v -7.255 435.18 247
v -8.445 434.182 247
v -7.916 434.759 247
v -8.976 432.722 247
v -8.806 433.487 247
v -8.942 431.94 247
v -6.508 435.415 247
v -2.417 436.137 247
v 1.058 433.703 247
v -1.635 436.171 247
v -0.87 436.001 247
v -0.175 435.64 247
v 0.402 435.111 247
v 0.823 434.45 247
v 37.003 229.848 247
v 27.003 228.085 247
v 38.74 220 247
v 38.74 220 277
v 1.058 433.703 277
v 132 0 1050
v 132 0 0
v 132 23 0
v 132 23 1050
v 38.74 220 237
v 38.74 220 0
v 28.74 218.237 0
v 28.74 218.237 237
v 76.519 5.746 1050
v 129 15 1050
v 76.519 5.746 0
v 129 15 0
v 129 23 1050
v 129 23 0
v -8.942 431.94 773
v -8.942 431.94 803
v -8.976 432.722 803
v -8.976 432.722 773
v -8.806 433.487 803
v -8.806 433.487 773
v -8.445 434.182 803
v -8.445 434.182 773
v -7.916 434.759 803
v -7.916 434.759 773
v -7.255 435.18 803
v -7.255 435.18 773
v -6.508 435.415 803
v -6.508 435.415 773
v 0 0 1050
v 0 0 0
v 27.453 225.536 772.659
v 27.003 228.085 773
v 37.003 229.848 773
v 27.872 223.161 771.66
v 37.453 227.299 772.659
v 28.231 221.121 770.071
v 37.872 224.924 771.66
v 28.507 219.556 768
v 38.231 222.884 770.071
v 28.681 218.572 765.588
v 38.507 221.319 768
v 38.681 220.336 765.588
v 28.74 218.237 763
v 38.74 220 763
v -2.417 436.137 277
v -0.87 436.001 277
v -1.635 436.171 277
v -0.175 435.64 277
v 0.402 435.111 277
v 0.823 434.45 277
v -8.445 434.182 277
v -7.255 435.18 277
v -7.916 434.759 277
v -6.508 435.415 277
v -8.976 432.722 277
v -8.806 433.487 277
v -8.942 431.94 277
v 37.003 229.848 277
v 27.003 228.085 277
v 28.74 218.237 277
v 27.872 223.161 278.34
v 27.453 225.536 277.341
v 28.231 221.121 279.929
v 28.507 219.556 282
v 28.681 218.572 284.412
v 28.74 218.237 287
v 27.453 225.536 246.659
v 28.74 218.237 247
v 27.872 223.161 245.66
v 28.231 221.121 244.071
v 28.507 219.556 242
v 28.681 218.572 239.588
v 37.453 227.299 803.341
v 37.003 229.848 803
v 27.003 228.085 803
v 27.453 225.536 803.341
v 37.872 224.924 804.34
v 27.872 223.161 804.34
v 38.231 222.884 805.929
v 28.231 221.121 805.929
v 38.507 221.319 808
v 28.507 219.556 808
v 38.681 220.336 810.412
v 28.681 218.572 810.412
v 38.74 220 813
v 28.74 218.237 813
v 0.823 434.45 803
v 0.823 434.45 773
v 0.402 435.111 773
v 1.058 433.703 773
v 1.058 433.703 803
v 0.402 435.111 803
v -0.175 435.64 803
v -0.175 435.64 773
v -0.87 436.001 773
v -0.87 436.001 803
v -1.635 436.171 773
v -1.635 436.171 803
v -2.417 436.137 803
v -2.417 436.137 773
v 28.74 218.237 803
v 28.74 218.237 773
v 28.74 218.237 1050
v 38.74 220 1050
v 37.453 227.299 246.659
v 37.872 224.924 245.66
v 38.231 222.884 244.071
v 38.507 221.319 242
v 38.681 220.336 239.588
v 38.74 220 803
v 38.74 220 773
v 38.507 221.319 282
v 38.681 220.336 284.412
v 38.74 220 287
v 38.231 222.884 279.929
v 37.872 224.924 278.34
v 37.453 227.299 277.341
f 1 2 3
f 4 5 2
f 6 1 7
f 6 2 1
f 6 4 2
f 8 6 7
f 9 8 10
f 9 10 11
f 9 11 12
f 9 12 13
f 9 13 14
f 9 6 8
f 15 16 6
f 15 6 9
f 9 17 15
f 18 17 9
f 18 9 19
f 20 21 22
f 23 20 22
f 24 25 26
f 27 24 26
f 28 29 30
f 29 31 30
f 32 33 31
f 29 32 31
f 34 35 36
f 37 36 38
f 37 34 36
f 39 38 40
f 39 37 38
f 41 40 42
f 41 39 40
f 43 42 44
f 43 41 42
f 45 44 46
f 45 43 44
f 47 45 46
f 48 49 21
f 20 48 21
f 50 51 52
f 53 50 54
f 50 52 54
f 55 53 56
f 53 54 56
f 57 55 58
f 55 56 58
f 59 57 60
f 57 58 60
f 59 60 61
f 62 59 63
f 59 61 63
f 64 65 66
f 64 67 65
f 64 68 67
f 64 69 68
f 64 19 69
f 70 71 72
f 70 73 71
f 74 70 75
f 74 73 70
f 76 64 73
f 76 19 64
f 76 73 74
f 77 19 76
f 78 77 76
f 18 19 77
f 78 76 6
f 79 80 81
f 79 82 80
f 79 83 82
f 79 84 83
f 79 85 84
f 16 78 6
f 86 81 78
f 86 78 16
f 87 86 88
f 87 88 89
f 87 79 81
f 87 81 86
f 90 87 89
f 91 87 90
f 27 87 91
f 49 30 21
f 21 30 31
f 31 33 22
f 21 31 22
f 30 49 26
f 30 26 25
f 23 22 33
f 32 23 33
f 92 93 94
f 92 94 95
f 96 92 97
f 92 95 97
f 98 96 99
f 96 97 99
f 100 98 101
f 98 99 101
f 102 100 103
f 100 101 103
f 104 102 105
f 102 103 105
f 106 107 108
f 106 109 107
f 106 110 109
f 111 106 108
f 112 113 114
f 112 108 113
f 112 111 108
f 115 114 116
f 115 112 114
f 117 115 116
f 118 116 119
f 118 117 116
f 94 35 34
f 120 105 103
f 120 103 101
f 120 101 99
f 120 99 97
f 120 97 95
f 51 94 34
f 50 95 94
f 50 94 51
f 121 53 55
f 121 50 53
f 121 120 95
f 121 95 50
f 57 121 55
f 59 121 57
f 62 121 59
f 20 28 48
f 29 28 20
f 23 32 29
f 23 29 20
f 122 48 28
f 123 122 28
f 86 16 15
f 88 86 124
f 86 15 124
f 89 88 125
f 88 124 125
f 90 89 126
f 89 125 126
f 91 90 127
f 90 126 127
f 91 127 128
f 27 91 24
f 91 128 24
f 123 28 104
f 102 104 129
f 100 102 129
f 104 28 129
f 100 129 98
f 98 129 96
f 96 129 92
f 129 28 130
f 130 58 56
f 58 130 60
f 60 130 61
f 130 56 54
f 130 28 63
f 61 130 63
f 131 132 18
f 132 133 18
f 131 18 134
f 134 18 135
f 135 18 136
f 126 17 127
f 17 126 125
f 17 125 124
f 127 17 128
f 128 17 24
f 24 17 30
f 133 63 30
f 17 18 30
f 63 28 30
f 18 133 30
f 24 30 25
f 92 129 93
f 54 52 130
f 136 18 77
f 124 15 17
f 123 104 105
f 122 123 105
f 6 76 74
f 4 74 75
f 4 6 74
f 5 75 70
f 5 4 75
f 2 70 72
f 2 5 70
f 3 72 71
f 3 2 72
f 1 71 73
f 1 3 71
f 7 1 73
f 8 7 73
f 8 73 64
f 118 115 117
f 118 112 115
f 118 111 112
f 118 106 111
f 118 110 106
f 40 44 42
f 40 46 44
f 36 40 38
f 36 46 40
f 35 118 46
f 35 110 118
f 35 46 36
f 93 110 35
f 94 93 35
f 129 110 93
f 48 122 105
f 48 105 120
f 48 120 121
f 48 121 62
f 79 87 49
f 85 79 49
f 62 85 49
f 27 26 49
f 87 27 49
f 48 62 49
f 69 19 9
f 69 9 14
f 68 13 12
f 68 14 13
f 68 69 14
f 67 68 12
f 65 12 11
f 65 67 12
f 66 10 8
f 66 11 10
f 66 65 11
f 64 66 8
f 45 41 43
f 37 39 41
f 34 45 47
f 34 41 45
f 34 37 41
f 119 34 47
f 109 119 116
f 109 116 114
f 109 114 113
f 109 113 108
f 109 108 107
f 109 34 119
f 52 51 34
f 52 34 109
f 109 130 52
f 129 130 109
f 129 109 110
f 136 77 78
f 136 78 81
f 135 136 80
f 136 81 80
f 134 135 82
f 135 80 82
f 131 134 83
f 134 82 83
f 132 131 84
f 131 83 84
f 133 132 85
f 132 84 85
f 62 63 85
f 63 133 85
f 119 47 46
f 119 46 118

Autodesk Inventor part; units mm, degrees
ref_plane "YZ Plane" through (0, 0, 0) normal (1, 0, 0) x (0, 1, 0)
ref_plane "XZ Plane" through (0, 0, 0) normal (0, 1, 0) x (-1, 0, 0)
ref_plane "XY Plane" through (0, 0, 0) normal (0, 0, 1) x (1, 0, 0)
sketch "Sketch1" plane through (0, 0, 0) normal (0, 0, 1) x (1, 0, 0)
  line L0 (0, 0) -> (132, 0)
  line L1 (132, 0) -> (132, 23)
  line L2 (132, 23) -> (129, 23)
  line L3 (38.7399, 220) -> (28.7399, 218.2367)
  line L4 (28.7399, 218.2367) -> (0, 0)
  line L5 (129, 23) -> (129, 15)
  line L6 (129, 15) -> (76.5186, 5.7461)
  line L7 (76.5186, 5.7461) -> (119.3723, 5.7461) construction
  line L8 (76.5186, 5.7461) -> (38.7399, 220)
  dimension "d0" = 132
  dimension "d1" = 220
  dimension "d2" = 23
  dimension "d3" = 3
  dimension "d4" = 8
  dimension "d5" = 53.291
  dimension "d6" = 10
  dimension "d7" = 90
  dimension "d8" = 10
  dimension "d9" = 10
extrude "Extrusion1" add sketch "Sketch1" along normal blind 1050
sketch "Sketch2" plane through (28.7399, 218.2367, 1050) normal (-0.1736, 0.9848, 0) x (0.9848, 0.1736, 0)
  line L0 (10.1543, 1050) -> (10.1543, 0) construction
  line L1 (0, 277) -> (10.1543, 277)
  line L2 (10.1543, 277) -> (10.1543, 247)
  line L3 (10.1543, 247) -> (0, 247)
  line L4 (0, 247) -> (0, 277)
  line L5 (0, 1050) -> (0, 0) construction
  line L6 (0, 803) -> (10.1543, 803)
  line L7 (10.1543, 803) -> (10.1543, 773)
  line L8 (10.1543, 773) -> (0, 773)
  line L9 (0, 773) -> (0, 803)
  line L10 (10.1543, 1050) -> (0, 1050) construction
  point P0 (-66.1997, 1050)
  dimension "d12" = 30
  dimension "d13" = 30
  dimension "d14" = 247
  dimension "d15" = 247
extrude "Extrusion2" add sketch "Sketch2" along normal blind 220
fillet "Fillet1" radius 3 4 edges at (0.5373, 436.6577, 788) (-9.4627, 434.8944, 788) (0.5373, 436.6577, 262) (-9.4627, 434.8944, 262)
fillet "Fillet2" radius 10 4 edges at (33.7399, 219.1184, 803) (33.7399, 219.1184, 277) (33.7399, 219.1184, 773) (33.7399, 219.1184, 247)
properties part number "sostenedor1"
